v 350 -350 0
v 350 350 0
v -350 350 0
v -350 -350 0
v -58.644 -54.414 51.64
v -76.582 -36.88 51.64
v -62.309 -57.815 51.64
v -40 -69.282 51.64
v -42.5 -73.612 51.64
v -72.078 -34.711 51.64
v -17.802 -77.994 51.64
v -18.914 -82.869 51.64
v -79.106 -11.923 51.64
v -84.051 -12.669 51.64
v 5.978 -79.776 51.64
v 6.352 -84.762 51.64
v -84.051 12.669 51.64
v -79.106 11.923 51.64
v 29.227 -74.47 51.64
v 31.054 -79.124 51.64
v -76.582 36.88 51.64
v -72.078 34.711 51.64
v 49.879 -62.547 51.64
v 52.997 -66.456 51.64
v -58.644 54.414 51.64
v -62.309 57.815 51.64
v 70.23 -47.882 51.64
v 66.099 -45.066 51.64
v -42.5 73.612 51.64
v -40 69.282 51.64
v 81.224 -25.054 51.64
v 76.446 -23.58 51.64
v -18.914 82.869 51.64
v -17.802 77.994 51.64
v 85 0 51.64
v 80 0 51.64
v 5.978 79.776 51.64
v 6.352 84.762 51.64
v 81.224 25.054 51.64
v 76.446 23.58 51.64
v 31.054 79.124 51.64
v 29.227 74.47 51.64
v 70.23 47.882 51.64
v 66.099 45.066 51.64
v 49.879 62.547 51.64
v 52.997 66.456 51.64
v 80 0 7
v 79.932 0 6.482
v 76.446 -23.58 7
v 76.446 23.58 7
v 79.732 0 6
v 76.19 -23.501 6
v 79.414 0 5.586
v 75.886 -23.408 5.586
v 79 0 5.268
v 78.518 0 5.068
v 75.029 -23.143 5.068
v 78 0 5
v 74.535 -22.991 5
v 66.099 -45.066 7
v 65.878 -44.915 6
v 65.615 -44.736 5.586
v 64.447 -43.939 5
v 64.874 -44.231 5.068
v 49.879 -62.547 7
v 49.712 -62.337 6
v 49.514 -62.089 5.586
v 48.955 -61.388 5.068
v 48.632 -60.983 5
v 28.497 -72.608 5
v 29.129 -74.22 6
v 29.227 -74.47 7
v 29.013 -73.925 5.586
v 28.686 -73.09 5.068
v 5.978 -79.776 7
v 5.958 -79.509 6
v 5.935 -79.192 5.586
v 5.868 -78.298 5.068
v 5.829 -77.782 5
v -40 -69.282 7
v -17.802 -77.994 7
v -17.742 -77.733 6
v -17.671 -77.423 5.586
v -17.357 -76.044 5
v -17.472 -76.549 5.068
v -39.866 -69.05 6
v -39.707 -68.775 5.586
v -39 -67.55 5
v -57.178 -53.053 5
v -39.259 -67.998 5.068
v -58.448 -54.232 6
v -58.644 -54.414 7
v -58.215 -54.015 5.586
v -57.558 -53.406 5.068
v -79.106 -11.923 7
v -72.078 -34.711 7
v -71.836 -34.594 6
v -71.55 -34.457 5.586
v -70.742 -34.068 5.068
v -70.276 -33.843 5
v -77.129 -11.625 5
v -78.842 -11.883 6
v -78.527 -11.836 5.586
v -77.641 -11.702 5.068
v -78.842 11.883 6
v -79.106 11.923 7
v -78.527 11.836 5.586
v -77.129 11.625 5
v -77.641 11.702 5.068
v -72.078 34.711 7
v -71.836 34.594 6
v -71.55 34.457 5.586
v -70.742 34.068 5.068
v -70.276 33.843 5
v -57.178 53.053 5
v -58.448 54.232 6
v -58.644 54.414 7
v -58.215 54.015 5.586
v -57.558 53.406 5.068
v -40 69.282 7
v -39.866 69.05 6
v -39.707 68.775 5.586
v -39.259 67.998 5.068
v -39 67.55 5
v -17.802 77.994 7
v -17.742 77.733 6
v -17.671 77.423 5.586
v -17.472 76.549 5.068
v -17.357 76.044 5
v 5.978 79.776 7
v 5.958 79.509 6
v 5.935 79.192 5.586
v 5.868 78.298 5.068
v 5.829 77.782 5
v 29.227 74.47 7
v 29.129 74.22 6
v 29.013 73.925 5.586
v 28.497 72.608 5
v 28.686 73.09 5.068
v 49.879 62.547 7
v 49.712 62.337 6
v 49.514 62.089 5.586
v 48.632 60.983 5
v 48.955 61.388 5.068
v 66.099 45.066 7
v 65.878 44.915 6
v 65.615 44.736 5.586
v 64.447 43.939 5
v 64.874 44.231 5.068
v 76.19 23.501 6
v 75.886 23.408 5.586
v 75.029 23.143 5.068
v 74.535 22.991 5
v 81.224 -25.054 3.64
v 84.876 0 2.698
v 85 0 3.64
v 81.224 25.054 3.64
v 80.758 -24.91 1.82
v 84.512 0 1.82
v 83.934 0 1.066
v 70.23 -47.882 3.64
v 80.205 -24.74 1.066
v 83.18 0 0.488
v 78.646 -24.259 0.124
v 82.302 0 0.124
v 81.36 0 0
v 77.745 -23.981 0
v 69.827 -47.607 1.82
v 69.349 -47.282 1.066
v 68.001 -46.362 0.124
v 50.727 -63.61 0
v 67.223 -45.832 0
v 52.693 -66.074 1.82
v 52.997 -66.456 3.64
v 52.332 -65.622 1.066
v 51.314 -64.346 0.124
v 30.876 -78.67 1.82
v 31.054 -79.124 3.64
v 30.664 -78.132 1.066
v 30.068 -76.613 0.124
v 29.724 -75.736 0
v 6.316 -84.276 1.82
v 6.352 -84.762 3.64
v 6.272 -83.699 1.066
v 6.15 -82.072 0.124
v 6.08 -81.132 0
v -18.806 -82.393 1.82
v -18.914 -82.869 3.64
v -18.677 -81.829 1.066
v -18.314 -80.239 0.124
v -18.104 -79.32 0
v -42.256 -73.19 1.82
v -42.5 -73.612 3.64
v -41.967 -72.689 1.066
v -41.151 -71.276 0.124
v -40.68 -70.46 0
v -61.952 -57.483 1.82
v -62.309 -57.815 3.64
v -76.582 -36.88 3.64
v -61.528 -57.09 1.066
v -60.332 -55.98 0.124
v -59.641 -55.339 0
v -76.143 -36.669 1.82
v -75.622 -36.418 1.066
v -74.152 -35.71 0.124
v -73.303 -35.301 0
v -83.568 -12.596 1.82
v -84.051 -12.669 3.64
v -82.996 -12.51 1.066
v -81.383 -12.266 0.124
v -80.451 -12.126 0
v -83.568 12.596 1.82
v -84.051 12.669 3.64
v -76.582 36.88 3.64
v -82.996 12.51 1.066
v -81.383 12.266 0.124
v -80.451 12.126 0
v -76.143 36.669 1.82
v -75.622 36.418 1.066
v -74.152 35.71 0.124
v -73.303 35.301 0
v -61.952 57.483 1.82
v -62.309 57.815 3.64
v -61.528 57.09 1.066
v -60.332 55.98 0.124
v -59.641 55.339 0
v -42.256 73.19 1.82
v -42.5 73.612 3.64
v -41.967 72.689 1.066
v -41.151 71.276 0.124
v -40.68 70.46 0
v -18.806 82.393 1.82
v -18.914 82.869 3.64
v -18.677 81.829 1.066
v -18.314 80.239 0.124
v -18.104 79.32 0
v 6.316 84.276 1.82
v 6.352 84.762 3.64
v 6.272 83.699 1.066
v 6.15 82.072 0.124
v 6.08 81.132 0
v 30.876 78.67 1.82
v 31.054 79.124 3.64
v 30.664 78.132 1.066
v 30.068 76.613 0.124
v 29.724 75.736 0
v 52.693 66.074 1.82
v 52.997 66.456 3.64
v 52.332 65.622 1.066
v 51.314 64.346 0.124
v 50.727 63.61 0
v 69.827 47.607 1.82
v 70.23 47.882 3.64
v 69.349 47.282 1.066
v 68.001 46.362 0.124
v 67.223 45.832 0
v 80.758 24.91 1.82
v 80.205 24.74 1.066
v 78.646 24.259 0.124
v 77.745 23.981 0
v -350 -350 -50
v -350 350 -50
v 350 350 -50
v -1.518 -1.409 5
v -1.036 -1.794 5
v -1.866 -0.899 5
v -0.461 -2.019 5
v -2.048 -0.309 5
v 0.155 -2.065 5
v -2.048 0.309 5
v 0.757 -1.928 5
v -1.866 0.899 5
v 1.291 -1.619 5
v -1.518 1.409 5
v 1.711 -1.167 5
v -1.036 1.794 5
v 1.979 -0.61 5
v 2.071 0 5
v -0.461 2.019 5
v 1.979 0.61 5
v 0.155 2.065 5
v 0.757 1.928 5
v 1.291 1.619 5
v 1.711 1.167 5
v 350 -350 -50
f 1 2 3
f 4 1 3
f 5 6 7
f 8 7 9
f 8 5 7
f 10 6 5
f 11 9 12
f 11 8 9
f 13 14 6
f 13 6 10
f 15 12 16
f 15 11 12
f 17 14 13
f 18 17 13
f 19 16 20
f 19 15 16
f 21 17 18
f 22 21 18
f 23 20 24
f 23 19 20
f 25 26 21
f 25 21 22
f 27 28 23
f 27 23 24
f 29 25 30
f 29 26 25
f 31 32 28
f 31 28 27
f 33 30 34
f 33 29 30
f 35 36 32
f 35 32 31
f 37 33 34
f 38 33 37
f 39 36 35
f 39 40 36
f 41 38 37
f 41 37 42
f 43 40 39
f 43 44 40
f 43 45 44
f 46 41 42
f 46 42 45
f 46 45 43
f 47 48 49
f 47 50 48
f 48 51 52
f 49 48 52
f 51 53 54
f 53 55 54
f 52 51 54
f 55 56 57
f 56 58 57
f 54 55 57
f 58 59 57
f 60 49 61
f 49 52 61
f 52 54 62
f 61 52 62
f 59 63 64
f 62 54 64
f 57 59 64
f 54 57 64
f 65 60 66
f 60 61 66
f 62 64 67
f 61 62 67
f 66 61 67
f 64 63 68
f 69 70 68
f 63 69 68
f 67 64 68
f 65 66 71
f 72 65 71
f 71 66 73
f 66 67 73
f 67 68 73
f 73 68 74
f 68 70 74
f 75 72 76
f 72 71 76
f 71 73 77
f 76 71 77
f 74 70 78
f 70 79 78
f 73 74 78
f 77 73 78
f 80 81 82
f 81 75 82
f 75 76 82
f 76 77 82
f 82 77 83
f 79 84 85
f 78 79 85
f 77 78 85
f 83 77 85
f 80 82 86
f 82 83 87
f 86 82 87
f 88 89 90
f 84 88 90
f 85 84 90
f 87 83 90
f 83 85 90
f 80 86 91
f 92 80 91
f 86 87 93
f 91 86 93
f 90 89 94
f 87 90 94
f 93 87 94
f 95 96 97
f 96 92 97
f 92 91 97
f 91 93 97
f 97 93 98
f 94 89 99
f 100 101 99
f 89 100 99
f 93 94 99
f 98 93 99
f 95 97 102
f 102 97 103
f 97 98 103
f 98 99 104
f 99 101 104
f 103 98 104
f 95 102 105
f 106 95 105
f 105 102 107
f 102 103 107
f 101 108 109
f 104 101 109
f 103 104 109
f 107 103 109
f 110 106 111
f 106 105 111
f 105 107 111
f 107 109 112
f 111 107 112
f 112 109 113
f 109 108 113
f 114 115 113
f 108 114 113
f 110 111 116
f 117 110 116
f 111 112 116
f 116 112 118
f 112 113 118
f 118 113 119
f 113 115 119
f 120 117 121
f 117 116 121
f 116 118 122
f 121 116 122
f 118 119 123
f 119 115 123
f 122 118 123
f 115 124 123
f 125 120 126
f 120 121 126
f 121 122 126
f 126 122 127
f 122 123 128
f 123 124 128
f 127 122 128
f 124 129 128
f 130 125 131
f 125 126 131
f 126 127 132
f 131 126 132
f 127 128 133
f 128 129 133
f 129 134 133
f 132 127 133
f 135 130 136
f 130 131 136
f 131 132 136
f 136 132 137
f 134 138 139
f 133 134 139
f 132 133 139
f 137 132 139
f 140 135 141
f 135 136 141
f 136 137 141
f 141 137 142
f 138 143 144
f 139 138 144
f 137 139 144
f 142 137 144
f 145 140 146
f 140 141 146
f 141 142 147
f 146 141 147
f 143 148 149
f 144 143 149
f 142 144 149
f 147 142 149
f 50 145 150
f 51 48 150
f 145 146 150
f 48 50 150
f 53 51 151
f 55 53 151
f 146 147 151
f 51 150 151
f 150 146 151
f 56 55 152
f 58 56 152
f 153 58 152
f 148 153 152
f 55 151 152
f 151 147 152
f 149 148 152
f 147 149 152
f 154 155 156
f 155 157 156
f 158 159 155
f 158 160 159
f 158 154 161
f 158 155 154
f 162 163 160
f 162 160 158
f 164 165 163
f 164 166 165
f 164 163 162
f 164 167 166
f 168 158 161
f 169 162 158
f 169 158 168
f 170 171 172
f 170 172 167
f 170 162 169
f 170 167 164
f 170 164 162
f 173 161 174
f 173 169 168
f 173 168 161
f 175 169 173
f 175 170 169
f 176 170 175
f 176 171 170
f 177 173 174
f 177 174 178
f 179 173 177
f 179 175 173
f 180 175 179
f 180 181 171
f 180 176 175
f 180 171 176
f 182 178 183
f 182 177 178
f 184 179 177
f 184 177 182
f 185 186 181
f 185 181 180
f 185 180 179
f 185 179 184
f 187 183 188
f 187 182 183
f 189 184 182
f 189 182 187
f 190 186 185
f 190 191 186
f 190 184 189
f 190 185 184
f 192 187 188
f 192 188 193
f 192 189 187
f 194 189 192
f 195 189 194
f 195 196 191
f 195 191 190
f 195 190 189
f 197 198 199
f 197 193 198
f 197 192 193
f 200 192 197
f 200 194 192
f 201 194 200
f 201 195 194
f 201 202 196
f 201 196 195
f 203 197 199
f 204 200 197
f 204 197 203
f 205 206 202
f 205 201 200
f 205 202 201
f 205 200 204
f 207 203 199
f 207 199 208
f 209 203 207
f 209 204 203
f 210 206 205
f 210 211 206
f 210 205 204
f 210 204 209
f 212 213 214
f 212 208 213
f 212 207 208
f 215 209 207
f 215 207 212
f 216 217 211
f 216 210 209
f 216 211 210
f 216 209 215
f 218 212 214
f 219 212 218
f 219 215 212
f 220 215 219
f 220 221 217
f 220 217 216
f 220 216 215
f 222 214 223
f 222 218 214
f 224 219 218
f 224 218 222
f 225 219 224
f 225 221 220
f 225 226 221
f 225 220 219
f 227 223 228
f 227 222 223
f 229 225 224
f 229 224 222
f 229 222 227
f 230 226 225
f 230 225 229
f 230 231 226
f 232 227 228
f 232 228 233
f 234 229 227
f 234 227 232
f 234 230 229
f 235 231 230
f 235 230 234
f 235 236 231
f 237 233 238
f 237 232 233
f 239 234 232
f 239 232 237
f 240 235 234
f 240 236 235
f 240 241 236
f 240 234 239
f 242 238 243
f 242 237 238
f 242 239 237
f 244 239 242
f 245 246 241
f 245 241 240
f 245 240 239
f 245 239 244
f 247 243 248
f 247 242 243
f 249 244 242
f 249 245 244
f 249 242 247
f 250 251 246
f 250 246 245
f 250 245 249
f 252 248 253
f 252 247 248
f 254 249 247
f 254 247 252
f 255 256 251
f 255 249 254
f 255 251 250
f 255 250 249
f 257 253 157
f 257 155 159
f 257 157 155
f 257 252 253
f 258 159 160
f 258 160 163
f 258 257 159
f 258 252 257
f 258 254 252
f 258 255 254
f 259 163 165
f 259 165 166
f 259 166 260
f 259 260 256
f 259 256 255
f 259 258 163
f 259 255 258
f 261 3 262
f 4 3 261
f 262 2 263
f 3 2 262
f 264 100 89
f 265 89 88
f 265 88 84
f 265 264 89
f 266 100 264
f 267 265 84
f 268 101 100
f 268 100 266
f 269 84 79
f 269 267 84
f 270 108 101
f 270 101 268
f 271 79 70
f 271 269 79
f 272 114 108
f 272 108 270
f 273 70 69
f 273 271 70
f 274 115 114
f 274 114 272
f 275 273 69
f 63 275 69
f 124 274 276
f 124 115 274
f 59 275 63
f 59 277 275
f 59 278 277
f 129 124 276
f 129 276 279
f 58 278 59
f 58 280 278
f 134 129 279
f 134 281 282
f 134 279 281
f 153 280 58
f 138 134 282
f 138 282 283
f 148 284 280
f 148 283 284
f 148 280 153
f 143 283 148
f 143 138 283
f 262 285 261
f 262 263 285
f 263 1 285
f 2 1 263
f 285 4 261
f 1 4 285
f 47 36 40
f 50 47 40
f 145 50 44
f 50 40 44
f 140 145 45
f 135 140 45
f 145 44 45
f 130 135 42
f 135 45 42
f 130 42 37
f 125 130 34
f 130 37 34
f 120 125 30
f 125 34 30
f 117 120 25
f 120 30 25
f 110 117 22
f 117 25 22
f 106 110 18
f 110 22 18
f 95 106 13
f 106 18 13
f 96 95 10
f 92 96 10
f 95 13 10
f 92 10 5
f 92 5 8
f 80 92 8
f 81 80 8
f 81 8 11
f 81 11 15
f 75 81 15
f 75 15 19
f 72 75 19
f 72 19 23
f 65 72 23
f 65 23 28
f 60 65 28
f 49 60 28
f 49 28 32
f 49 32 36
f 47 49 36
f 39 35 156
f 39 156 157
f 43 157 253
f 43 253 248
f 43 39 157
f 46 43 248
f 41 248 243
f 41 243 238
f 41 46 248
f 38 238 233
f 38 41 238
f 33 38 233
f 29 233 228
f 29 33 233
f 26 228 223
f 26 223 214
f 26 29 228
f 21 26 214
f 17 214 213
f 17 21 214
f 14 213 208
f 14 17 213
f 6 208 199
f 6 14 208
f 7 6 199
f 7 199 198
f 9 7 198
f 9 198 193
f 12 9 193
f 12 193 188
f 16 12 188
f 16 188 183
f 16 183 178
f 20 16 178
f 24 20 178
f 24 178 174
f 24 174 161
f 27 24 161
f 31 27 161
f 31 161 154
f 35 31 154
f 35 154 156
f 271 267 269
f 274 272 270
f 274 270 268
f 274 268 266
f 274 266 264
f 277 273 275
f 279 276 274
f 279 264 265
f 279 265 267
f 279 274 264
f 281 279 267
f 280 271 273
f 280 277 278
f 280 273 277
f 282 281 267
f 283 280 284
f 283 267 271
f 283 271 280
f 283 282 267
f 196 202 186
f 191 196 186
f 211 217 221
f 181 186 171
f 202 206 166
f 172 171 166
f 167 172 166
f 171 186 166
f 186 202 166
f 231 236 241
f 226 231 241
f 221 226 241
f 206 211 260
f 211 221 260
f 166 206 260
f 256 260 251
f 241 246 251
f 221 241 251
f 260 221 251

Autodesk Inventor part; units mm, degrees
ref_plane "YZ Plane" through (0, 0, 0) normal (1, 0, 0) x (0, 1, 0)
ref_plane "XZ Plane" through (0, 0, 0) normal (0, 1, 0) x (-1, 0, 0)
ref_plane "XY Plane" through (0, 0, 0) normal (0, 0, 1) x (1, 0, 0)
sketch "Эскиз3" plane through (0, 0, 0) normal (0, 1, 0) x (-1, 0, 0)
  line L0 (0, 0) -> (-81.3599, 0)
  arc A0 (-85, 3.6401) -> (-81.3599, 0) centre (-81.3599, 3.6401) ccw
  line L1 (-2.0712, 5) -> (-78, 5)
  arc A1 (-80, 7) -> (-78, 5) centre (-78, 7) ccw
  line L2 (0, 0) -> (0, 5)
  line L3 (0, 5) -> (-2.0712, 5)
  line L4 (0, -11.2327) -> (0, 62.1188) projected
  line L5 (-85, 3.6401) -> (-85, 51.6401)
  line L6 (-80, 7) -> (-80, 51.6401)
  line L7 (-80, 51.6401) -> (-85, 51.6401)
  dimension "d7" = 5
  dimension "d11" = 48
  dimension "d16" = 85
  dimension "d17" = 5
revolve "Вращение1" add sketch "Эскиз3" angle 360 about axis through (0, 0, -10) along (0, 0, 1)
sketch "Эскиз4" plane through (0, 0, 0) normal (0, 0, -1) x (-1, 0, 0)
  point P0 (0, 0)
sketch "Эскиз5" plane through (0, 0, 0) normal (0, 0, -1) x (-1, 0, 0)
  line L0 (350, -350) -> (-350, -350)
  line L1 (-350, -350) -> (-350, 350)
  line L2 (-350, 350) -> (350, 350)
  line L3 (350, 350) -> (350, -350)
  line L4 (350, -350) -> (-350, 350) construction
  line L5 (-350, -350) -> (350, 350) construction
  point P0 (0, 0)
  dimension "d12" = 700
  dimension "d13" = 700
extrude "Выдавливание2" add sketch "Эскиз5" along normal blind 50 separate body
properties part number "крепеж крышки+доска"
